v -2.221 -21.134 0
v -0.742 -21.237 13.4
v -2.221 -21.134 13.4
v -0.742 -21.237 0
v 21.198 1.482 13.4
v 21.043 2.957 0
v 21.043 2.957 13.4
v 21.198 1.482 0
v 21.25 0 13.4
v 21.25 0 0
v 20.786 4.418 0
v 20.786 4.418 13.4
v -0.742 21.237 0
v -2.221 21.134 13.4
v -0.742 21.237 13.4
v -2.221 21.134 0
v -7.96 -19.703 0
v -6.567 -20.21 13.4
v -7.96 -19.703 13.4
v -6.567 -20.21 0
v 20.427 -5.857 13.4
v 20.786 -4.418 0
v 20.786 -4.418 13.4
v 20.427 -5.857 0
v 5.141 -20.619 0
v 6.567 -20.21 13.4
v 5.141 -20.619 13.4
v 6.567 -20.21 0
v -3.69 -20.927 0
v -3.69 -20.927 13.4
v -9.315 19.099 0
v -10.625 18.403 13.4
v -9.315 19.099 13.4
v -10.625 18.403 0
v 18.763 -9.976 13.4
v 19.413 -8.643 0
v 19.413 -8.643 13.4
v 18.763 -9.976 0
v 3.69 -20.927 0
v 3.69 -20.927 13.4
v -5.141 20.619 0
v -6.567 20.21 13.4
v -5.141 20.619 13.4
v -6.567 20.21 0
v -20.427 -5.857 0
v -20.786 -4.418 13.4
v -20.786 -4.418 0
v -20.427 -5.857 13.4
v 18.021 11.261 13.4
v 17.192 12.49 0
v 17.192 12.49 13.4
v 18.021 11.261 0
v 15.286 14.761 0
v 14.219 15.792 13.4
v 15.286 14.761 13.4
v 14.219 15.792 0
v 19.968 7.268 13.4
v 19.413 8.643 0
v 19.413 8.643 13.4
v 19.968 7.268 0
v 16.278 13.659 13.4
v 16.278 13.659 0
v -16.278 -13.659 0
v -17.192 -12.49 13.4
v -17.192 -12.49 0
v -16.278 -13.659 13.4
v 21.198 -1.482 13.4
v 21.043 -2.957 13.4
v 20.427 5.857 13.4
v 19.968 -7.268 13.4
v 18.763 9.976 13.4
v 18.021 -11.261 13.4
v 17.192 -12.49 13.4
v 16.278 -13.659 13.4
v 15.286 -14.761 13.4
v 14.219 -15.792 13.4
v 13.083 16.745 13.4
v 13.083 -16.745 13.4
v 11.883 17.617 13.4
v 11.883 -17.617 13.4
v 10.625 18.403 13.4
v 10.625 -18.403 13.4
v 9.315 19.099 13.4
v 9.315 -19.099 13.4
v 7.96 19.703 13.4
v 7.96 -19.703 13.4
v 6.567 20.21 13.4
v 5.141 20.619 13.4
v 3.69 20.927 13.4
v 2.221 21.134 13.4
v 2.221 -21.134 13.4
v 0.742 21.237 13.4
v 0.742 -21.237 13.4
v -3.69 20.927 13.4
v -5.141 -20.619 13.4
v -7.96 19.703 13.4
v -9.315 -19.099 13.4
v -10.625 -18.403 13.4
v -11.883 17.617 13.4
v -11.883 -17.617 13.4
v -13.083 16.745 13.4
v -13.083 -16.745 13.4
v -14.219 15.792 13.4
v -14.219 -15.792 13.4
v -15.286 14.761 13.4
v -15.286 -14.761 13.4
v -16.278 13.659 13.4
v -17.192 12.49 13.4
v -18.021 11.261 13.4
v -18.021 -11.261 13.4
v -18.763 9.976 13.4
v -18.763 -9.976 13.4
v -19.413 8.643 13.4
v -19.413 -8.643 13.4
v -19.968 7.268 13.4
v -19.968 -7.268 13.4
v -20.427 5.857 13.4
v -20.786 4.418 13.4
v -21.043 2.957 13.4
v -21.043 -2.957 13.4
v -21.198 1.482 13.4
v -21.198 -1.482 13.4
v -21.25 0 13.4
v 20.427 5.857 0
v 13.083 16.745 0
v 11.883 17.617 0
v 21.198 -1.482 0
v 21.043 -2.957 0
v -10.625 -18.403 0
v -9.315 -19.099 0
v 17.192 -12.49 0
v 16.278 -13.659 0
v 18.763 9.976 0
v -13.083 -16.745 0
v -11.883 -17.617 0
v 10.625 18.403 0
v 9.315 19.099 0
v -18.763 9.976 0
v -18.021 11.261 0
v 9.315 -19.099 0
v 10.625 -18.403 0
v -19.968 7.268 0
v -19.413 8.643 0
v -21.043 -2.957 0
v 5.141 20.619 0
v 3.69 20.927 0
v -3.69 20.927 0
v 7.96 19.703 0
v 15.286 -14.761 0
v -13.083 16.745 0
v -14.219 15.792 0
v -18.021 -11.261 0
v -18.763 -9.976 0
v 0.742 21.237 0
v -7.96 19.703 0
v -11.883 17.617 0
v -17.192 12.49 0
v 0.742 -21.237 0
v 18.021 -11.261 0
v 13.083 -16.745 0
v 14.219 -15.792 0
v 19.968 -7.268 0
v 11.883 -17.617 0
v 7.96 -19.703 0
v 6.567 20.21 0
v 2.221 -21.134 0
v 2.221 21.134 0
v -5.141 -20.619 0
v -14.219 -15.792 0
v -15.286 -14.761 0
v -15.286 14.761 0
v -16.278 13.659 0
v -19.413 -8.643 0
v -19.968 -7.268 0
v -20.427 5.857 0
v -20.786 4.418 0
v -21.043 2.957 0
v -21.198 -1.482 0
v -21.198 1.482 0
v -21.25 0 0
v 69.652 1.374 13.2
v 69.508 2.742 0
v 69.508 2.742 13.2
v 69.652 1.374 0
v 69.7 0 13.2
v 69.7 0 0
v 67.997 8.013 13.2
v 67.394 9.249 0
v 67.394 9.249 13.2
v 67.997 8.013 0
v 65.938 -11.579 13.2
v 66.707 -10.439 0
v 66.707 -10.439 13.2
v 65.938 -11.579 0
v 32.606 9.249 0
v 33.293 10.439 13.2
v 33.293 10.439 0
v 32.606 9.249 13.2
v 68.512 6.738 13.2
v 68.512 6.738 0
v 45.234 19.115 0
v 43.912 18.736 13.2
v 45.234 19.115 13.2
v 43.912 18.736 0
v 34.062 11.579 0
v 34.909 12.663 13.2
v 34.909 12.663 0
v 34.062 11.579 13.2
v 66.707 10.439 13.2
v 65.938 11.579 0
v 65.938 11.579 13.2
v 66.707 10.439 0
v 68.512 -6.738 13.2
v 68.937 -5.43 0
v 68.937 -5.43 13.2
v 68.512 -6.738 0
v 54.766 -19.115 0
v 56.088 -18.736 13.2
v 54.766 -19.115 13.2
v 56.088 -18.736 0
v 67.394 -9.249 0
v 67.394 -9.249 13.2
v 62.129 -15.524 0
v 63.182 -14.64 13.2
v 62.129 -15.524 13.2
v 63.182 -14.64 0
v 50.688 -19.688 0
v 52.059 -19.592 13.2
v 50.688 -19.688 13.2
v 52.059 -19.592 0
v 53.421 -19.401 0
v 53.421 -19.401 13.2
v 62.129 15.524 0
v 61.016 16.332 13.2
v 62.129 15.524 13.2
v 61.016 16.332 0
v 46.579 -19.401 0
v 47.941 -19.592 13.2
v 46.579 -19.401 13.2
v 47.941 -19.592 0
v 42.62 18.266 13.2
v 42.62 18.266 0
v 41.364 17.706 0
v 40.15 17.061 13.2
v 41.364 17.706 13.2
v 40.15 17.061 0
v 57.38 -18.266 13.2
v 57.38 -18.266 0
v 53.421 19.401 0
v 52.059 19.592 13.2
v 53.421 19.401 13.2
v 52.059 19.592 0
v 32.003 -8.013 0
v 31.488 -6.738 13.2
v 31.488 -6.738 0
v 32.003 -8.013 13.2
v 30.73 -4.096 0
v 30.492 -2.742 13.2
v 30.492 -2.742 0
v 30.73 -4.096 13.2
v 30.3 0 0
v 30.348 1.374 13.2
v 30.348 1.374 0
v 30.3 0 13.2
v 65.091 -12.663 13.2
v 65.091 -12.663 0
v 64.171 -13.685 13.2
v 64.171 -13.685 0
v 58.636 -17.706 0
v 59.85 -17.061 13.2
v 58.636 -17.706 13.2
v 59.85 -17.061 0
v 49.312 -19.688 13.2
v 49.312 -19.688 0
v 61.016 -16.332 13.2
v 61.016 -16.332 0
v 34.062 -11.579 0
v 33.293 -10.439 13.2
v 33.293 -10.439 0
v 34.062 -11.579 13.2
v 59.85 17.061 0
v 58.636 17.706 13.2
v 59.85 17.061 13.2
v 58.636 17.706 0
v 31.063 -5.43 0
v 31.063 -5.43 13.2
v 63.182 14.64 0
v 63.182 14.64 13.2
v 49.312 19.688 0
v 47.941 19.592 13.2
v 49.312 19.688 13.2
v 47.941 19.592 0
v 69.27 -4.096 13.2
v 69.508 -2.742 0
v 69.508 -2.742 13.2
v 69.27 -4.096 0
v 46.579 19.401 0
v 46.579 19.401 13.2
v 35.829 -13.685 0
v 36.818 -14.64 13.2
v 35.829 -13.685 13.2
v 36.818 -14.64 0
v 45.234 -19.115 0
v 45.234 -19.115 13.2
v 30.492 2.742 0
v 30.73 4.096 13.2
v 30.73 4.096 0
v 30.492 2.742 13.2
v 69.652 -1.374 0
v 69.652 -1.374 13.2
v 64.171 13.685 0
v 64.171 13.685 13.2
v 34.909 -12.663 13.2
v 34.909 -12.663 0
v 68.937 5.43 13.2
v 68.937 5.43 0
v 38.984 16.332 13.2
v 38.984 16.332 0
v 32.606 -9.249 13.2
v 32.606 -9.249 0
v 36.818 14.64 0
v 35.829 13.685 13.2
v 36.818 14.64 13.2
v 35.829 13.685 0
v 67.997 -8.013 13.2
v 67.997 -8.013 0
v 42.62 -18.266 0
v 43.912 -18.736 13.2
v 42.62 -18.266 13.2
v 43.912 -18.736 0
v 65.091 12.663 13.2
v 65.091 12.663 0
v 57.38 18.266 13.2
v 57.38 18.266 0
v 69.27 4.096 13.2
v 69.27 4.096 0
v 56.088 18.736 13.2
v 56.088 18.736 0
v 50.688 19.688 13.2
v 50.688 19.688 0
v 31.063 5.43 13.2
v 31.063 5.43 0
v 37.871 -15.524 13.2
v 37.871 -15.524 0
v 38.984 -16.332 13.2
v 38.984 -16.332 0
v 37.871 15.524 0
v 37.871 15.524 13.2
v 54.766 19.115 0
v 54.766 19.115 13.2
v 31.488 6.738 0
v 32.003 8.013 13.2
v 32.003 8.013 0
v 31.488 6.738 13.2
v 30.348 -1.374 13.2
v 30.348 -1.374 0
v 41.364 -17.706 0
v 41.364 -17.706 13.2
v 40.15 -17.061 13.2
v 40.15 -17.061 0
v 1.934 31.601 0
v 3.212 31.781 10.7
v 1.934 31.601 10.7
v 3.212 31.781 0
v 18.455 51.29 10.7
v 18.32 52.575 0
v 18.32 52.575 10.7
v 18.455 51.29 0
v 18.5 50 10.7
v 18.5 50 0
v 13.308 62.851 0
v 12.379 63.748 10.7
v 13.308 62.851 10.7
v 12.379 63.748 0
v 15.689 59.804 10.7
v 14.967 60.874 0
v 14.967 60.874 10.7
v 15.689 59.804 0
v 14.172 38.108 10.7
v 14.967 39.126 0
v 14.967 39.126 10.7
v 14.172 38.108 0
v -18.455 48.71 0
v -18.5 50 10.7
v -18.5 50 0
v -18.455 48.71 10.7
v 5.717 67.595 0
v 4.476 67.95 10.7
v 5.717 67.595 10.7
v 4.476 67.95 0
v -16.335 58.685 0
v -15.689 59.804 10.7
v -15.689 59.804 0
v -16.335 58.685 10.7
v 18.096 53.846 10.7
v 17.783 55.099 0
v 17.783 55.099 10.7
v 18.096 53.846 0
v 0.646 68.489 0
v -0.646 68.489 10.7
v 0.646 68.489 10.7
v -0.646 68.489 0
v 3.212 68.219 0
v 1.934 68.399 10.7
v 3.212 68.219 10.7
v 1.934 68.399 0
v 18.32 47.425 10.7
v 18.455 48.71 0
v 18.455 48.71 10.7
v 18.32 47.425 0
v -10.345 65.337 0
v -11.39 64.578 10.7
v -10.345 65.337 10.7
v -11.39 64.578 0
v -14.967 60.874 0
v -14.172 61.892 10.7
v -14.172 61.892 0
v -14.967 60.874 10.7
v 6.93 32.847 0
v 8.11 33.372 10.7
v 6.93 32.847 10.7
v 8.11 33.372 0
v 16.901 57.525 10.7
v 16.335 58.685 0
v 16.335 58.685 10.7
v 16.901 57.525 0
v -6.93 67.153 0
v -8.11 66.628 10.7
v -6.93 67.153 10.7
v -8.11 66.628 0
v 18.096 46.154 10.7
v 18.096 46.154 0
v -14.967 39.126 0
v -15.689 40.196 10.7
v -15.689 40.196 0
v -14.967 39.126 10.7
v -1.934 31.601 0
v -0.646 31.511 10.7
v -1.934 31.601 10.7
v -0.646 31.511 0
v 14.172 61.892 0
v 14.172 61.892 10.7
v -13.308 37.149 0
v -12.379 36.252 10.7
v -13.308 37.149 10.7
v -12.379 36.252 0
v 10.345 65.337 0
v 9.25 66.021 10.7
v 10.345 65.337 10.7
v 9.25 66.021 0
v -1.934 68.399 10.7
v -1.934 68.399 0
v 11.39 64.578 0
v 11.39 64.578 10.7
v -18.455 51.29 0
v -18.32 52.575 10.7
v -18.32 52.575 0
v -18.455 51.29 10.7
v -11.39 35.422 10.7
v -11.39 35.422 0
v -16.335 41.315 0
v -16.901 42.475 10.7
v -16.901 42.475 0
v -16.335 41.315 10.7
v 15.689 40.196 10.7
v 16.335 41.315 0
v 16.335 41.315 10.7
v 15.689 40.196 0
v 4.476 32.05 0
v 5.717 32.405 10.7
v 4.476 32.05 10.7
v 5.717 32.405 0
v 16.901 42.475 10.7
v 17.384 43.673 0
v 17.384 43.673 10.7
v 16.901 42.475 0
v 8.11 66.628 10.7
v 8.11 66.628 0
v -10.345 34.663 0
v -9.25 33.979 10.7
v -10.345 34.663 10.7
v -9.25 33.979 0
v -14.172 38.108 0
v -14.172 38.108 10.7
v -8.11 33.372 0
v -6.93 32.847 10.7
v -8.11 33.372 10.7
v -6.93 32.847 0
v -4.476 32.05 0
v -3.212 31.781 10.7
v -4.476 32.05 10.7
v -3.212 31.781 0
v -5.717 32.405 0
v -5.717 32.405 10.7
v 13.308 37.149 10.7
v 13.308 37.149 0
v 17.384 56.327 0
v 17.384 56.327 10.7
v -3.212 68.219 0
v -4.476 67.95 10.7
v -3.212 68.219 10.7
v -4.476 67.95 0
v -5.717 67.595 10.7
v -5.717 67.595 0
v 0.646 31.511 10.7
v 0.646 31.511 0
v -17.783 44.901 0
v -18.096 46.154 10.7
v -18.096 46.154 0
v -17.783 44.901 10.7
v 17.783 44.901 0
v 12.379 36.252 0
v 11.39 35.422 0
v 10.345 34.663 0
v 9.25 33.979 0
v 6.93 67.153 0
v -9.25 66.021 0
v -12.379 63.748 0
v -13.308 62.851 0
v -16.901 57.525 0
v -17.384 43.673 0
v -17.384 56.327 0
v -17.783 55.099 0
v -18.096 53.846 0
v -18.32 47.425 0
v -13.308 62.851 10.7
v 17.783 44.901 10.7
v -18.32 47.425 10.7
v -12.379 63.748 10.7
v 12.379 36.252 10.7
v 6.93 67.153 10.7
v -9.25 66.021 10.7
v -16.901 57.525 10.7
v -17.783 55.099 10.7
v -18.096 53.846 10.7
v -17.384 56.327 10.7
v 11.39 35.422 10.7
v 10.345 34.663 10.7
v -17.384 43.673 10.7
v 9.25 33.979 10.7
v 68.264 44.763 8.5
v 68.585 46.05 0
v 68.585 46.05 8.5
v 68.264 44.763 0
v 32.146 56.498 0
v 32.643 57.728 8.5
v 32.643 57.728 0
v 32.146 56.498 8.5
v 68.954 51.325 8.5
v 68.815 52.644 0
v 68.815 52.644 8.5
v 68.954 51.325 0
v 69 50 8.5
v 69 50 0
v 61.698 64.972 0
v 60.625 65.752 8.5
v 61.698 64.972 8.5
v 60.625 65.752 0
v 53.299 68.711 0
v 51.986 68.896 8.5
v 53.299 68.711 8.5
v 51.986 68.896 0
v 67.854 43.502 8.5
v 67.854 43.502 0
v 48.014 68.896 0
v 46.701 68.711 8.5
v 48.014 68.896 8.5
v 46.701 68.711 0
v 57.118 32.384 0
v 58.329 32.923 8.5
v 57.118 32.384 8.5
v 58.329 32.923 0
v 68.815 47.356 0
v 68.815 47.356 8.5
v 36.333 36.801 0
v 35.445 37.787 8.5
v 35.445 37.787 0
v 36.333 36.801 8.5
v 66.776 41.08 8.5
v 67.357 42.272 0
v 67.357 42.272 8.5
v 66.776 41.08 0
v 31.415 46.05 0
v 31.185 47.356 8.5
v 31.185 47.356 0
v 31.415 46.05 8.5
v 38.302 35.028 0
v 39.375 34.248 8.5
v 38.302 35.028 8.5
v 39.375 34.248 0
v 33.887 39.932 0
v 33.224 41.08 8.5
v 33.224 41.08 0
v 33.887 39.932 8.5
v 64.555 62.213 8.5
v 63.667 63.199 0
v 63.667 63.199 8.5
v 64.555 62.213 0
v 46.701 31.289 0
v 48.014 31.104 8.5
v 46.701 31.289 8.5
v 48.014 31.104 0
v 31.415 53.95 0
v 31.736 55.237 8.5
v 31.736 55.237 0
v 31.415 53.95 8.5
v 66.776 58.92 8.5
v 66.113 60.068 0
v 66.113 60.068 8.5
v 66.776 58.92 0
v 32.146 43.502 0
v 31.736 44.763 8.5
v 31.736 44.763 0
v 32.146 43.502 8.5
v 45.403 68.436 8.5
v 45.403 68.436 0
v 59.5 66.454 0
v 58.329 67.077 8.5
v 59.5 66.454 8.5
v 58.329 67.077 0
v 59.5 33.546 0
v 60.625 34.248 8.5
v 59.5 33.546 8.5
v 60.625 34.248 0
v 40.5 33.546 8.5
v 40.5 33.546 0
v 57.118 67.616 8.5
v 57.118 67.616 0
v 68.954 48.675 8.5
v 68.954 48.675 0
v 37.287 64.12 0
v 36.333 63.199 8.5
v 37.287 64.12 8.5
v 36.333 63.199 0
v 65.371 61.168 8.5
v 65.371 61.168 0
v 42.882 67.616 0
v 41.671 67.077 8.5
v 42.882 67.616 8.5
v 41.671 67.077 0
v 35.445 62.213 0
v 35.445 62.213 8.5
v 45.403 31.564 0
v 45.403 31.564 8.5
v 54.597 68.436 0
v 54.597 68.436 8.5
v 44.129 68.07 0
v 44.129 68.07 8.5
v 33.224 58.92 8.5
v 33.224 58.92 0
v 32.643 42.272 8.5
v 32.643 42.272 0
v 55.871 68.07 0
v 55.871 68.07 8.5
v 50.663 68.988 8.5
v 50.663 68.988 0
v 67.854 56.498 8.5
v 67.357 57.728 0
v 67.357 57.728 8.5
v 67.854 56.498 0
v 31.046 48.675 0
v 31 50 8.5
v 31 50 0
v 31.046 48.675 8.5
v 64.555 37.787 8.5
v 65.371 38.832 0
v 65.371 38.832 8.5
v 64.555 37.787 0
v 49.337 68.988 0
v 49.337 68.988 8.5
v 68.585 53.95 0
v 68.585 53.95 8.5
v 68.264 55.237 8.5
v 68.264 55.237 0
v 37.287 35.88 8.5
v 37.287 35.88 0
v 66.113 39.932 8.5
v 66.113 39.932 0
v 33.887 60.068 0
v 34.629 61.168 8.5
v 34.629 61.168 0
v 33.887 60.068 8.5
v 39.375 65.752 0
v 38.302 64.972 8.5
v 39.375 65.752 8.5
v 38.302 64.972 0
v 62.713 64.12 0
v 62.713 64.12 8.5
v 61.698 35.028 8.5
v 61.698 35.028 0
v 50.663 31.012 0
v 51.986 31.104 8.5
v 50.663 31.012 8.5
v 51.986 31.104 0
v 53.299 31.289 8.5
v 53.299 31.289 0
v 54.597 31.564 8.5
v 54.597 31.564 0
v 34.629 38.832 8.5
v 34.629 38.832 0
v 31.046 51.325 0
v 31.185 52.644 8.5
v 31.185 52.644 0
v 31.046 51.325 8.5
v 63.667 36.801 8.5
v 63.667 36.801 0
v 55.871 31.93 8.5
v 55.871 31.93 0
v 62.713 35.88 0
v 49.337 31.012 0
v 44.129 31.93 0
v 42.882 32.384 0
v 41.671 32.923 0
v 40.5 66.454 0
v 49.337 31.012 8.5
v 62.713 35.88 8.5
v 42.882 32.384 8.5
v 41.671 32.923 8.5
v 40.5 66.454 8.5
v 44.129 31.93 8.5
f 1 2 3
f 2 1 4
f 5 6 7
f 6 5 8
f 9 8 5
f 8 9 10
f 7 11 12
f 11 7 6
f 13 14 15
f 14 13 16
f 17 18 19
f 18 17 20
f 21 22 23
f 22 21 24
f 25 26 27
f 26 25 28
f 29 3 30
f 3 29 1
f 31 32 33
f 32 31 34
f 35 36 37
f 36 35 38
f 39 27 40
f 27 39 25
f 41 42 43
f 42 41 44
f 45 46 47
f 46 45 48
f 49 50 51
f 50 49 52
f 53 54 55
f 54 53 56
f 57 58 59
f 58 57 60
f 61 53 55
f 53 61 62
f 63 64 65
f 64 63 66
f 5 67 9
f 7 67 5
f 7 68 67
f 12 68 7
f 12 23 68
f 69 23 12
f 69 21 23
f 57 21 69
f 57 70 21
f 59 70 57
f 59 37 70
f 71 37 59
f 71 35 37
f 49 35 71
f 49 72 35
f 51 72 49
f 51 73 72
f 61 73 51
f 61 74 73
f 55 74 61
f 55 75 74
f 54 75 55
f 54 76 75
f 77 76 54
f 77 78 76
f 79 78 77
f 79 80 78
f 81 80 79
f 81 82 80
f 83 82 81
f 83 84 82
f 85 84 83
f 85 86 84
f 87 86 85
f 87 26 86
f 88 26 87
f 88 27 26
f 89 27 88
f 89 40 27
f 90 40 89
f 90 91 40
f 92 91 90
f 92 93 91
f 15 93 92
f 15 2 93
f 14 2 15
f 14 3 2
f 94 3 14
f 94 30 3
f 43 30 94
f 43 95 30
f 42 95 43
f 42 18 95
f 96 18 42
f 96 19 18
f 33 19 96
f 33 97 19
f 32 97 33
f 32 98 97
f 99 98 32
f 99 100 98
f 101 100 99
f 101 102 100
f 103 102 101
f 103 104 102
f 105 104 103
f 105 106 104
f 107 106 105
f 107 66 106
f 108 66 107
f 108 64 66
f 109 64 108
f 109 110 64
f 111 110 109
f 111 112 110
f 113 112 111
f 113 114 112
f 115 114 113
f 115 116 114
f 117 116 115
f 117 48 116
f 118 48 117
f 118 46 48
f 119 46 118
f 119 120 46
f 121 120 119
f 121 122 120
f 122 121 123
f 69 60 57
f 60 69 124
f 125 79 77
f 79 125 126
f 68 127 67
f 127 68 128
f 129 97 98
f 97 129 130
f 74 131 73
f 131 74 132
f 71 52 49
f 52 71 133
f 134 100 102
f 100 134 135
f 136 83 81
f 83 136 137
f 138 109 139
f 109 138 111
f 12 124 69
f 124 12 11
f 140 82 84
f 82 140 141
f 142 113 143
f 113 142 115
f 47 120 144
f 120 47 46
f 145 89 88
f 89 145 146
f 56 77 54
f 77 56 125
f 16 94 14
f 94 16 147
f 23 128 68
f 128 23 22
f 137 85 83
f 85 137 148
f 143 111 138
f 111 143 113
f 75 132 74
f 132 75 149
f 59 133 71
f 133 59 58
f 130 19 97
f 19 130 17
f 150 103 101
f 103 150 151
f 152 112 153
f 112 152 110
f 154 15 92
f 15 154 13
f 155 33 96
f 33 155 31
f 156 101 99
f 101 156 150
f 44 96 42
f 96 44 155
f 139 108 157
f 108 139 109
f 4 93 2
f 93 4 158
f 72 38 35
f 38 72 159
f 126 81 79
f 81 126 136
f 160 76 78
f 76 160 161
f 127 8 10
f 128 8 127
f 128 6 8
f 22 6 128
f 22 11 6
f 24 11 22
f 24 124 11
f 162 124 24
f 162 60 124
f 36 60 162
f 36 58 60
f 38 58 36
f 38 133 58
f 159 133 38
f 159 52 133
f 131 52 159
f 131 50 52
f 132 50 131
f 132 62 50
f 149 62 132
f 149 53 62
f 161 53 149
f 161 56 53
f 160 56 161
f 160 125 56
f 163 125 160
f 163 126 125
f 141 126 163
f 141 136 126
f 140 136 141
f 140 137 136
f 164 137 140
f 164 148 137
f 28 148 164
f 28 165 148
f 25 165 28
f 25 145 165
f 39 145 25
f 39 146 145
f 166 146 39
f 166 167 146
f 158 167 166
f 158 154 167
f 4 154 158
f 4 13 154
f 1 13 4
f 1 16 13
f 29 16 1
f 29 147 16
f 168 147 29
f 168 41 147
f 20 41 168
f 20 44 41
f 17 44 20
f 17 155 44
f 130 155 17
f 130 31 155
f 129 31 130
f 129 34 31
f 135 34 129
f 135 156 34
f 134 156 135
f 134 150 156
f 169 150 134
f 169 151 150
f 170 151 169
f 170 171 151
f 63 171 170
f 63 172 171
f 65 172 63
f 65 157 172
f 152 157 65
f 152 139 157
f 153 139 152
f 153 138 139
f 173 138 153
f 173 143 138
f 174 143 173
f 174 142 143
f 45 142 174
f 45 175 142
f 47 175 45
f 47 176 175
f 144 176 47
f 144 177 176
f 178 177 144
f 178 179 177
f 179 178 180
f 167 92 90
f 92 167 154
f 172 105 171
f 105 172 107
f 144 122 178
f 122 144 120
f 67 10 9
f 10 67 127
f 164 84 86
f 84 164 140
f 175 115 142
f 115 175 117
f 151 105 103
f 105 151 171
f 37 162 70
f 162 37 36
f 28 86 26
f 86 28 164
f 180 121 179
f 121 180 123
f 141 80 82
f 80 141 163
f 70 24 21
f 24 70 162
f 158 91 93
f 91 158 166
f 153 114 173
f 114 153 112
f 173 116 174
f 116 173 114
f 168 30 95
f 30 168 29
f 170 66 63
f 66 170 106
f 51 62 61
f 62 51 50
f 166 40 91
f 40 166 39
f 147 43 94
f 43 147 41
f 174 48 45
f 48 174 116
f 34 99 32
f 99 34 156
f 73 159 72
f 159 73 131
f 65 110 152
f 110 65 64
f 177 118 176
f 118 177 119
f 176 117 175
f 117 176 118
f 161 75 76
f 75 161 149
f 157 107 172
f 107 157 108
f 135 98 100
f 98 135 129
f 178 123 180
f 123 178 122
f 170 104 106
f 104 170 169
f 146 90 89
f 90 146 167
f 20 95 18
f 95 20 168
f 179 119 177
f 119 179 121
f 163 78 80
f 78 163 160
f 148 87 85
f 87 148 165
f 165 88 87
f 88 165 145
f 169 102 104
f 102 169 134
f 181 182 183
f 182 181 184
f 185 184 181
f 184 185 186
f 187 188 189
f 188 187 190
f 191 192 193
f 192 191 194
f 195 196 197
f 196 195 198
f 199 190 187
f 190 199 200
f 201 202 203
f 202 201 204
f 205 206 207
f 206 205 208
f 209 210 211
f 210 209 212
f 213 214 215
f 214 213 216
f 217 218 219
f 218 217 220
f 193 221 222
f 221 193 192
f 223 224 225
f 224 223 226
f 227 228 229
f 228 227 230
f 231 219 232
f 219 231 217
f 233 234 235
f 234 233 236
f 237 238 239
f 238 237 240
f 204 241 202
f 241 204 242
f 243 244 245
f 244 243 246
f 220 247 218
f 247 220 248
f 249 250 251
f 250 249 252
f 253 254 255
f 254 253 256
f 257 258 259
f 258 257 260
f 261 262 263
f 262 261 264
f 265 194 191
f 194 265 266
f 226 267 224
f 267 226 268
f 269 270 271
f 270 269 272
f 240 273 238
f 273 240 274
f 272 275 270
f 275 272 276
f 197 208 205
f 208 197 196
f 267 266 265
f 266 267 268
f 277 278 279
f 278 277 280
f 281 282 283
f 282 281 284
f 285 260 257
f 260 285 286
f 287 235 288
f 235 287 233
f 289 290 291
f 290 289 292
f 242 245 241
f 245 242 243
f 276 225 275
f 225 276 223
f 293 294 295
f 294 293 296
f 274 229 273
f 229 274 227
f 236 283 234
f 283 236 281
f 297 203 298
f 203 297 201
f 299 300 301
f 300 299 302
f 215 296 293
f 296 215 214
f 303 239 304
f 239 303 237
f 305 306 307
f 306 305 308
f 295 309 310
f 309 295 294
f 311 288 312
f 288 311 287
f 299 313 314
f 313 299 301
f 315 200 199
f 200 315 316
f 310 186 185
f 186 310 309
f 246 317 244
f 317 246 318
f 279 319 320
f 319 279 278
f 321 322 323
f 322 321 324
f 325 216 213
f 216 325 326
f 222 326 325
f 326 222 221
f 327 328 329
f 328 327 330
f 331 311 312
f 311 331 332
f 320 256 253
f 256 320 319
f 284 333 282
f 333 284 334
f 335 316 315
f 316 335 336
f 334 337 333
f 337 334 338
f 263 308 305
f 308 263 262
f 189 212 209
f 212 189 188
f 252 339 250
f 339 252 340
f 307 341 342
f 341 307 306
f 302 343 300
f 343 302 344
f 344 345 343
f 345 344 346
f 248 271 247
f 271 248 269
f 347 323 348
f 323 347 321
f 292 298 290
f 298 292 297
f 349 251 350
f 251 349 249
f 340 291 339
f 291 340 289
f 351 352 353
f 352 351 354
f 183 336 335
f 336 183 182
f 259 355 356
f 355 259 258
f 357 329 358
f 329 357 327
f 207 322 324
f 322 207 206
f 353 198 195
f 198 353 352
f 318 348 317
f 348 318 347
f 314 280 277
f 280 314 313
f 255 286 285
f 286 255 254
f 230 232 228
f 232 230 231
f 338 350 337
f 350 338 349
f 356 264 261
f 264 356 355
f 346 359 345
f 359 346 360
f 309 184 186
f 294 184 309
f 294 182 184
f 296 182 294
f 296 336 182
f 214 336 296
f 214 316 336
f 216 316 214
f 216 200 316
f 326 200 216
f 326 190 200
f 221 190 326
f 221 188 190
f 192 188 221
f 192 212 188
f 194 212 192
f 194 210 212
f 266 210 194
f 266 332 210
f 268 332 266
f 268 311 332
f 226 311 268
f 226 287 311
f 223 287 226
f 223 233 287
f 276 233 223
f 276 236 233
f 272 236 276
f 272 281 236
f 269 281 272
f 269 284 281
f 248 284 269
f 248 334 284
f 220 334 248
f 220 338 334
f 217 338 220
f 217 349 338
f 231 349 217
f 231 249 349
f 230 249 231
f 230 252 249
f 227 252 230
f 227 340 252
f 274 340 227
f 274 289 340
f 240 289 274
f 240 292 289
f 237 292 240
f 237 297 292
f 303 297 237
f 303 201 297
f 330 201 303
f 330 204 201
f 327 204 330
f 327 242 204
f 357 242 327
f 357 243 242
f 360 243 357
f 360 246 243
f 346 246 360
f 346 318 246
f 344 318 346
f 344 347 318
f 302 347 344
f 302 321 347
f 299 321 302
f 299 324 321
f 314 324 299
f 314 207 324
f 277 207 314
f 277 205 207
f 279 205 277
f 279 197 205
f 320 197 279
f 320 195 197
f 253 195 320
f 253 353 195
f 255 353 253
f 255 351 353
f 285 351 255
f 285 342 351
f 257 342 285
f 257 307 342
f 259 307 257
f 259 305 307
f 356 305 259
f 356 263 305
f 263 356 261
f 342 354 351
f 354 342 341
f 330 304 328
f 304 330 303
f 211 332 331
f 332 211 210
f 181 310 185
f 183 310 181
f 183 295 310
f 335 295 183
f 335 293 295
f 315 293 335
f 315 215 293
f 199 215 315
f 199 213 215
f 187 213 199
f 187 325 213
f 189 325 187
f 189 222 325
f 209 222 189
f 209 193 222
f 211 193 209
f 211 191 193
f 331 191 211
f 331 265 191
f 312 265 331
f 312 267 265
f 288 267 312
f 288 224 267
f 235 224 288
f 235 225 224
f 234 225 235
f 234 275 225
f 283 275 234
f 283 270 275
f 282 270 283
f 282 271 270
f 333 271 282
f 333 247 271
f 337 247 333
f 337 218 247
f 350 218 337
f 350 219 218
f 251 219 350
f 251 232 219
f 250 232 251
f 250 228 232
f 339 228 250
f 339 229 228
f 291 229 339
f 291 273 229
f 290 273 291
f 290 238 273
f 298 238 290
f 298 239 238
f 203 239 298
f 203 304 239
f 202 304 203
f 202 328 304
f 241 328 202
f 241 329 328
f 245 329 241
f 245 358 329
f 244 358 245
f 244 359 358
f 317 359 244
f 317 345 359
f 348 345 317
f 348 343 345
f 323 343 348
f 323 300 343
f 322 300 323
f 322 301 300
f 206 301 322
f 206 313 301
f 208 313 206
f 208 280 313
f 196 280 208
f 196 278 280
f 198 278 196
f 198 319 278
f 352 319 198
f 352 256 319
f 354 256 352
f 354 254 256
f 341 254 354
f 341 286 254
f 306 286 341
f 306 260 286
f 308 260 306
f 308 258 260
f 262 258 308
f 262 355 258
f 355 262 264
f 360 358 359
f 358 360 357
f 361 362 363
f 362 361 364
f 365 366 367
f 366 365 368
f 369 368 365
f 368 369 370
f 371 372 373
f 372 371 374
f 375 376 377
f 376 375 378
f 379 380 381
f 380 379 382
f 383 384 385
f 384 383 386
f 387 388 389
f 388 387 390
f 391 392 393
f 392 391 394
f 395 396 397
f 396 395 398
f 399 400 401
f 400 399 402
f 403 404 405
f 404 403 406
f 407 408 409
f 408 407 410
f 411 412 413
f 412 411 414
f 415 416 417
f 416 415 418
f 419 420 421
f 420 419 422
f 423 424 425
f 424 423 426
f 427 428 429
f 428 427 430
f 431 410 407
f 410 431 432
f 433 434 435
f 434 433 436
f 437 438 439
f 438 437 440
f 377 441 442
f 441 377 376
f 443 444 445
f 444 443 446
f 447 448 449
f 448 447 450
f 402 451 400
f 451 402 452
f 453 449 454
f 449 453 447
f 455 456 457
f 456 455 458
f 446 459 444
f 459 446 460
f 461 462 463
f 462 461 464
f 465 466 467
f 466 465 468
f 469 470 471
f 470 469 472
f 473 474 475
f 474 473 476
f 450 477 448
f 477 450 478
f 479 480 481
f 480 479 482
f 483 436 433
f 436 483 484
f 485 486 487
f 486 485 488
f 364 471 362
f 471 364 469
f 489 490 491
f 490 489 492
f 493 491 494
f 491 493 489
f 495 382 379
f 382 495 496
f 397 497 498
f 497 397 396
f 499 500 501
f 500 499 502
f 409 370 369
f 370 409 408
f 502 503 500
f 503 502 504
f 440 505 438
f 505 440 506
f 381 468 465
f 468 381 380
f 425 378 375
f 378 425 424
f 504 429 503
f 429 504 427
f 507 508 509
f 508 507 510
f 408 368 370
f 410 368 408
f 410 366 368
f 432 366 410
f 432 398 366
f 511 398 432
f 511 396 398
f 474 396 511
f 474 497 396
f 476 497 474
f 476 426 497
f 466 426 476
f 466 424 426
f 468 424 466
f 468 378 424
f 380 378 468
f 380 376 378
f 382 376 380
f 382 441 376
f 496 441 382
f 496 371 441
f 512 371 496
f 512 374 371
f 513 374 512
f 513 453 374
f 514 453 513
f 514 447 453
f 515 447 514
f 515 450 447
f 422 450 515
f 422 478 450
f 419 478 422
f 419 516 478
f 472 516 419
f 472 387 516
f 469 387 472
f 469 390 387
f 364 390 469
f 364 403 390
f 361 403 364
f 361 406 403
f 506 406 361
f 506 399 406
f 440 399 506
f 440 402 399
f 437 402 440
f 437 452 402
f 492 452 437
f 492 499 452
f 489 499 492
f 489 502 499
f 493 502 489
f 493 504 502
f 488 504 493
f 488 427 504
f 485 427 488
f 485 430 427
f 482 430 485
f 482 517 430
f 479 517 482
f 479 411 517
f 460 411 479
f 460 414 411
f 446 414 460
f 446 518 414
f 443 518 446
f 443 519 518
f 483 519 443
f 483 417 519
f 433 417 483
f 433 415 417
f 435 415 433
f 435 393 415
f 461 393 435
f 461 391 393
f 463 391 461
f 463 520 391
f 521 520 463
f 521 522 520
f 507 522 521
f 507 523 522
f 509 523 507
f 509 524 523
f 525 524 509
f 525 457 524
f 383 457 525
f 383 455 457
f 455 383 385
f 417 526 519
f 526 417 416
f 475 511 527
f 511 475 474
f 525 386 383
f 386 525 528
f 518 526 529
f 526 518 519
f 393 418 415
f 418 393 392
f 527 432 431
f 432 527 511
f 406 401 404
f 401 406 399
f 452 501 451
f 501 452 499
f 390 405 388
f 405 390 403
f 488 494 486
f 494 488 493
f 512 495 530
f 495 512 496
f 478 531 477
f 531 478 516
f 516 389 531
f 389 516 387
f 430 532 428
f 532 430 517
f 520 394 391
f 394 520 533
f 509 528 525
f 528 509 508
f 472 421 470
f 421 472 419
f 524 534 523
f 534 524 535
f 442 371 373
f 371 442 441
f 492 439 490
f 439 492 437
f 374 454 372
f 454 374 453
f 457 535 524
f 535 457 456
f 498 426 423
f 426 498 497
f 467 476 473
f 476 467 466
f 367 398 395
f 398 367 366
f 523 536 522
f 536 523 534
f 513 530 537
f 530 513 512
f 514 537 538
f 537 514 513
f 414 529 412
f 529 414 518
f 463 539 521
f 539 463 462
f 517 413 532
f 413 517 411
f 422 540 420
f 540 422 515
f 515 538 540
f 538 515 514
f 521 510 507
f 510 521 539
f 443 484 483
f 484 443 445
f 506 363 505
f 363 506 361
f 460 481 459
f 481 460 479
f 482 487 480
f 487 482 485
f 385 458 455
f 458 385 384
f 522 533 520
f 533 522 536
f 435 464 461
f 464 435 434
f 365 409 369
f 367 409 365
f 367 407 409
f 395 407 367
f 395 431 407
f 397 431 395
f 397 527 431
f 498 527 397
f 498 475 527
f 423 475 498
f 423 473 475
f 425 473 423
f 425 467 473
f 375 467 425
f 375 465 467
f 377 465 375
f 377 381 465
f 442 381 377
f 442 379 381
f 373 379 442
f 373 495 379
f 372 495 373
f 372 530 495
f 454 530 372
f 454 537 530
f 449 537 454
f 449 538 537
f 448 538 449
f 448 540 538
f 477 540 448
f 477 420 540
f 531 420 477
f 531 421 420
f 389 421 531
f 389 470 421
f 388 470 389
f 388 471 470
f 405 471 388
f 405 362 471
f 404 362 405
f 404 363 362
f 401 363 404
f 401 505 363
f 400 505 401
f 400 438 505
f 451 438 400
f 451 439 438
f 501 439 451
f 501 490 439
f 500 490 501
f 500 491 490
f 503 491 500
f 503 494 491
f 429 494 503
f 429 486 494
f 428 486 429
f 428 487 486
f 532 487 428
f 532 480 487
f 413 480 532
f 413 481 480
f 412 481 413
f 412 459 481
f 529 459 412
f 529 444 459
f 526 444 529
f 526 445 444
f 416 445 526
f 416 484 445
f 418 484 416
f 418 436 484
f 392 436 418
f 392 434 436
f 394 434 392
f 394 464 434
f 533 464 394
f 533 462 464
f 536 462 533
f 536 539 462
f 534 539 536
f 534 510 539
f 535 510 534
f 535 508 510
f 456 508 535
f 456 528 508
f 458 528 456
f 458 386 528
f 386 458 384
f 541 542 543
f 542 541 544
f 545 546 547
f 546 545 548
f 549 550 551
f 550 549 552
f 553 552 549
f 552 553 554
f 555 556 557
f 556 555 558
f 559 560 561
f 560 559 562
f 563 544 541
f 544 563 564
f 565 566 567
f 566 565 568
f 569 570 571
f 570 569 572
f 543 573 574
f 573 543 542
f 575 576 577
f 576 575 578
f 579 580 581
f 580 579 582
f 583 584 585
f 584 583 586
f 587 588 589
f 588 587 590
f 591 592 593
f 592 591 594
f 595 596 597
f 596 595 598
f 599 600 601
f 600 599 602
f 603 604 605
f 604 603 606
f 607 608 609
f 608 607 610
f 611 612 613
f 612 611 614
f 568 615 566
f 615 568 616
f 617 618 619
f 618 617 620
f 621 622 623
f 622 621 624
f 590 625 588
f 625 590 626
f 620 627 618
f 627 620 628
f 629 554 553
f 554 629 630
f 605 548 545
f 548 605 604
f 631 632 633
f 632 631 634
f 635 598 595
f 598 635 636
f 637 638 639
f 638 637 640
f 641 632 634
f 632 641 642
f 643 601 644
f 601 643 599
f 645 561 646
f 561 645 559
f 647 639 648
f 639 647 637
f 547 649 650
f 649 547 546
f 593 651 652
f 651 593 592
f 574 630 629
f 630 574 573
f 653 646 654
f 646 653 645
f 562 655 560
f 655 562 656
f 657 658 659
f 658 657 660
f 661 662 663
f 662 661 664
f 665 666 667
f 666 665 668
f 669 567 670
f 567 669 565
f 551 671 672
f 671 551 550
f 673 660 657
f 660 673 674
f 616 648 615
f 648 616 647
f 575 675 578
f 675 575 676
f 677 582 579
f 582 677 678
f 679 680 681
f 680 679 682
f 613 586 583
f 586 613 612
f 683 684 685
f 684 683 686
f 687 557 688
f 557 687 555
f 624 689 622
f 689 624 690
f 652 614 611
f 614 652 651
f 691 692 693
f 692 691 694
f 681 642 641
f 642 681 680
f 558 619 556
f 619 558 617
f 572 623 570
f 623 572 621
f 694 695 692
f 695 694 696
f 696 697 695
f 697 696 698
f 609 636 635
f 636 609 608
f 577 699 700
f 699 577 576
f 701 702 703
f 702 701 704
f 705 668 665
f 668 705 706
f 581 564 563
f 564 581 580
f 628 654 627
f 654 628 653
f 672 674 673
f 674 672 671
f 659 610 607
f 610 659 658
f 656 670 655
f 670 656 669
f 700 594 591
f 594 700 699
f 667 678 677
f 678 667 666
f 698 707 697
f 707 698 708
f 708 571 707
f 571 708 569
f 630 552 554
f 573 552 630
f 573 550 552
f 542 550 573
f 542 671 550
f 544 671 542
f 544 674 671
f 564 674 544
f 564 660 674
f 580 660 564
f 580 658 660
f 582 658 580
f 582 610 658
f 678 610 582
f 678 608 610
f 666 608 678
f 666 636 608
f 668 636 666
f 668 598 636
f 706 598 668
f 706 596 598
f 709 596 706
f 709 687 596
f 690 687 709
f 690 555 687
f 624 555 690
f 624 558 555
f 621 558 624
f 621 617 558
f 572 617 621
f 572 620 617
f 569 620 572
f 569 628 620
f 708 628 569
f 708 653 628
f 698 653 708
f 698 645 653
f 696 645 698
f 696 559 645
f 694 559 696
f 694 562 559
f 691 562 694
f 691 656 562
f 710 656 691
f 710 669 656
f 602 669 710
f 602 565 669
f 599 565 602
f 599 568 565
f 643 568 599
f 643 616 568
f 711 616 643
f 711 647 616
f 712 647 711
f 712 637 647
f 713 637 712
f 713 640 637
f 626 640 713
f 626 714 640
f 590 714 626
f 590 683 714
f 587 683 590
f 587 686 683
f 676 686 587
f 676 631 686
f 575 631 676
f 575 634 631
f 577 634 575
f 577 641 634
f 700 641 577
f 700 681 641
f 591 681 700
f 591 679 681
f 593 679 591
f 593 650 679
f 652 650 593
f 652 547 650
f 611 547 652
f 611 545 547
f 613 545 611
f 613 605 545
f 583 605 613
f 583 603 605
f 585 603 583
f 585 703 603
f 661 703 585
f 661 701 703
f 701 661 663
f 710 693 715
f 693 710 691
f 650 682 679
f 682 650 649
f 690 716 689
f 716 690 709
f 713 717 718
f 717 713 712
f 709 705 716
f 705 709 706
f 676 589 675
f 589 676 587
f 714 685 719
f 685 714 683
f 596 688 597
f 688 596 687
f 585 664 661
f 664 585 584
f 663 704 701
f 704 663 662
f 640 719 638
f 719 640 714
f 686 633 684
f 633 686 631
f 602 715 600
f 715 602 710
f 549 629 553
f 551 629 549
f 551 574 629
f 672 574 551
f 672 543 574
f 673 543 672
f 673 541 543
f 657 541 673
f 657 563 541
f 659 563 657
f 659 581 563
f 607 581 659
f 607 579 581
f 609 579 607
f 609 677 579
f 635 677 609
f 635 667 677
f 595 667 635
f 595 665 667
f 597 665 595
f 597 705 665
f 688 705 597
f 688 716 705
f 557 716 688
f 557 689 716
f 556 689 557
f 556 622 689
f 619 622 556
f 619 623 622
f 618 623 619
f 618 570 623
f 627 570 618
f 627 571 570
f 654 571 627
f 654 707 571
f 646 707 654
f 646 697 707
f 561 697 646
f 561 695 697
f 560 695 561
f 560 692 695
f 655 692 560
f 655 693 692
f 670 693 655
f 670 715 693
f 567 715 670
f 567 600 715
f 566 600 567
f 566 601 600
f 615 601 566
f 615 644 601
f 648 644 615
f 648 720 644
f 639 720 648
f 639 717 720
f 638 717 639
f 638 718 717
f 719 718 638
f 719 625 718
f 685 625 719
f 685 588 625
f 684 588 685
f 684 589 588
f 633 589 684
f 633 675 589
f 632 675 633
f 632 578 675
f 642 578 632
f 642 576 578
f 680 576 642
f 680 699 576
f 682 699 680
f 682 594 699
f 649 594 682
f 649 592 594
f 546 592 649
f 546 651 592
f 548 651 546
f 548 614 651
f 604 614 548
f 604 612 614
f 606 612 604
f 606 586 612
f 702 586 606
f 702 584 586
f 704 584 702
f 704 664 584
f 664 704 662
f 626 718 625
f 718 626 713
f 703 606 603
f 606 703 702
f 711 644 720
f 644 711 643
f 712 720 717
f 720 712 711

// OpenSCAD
$fn = 90;

cylinder(d = 42.5, h = 13.4);

translate([50, 0, 0]) cylinder(d = 39.4, h = 13.2);

translate([0, 50, 0]) cylinder(d = 37, h = 10.7);


translate([50, 50, 0]) cylinder(d = 38, h = 8.5);
